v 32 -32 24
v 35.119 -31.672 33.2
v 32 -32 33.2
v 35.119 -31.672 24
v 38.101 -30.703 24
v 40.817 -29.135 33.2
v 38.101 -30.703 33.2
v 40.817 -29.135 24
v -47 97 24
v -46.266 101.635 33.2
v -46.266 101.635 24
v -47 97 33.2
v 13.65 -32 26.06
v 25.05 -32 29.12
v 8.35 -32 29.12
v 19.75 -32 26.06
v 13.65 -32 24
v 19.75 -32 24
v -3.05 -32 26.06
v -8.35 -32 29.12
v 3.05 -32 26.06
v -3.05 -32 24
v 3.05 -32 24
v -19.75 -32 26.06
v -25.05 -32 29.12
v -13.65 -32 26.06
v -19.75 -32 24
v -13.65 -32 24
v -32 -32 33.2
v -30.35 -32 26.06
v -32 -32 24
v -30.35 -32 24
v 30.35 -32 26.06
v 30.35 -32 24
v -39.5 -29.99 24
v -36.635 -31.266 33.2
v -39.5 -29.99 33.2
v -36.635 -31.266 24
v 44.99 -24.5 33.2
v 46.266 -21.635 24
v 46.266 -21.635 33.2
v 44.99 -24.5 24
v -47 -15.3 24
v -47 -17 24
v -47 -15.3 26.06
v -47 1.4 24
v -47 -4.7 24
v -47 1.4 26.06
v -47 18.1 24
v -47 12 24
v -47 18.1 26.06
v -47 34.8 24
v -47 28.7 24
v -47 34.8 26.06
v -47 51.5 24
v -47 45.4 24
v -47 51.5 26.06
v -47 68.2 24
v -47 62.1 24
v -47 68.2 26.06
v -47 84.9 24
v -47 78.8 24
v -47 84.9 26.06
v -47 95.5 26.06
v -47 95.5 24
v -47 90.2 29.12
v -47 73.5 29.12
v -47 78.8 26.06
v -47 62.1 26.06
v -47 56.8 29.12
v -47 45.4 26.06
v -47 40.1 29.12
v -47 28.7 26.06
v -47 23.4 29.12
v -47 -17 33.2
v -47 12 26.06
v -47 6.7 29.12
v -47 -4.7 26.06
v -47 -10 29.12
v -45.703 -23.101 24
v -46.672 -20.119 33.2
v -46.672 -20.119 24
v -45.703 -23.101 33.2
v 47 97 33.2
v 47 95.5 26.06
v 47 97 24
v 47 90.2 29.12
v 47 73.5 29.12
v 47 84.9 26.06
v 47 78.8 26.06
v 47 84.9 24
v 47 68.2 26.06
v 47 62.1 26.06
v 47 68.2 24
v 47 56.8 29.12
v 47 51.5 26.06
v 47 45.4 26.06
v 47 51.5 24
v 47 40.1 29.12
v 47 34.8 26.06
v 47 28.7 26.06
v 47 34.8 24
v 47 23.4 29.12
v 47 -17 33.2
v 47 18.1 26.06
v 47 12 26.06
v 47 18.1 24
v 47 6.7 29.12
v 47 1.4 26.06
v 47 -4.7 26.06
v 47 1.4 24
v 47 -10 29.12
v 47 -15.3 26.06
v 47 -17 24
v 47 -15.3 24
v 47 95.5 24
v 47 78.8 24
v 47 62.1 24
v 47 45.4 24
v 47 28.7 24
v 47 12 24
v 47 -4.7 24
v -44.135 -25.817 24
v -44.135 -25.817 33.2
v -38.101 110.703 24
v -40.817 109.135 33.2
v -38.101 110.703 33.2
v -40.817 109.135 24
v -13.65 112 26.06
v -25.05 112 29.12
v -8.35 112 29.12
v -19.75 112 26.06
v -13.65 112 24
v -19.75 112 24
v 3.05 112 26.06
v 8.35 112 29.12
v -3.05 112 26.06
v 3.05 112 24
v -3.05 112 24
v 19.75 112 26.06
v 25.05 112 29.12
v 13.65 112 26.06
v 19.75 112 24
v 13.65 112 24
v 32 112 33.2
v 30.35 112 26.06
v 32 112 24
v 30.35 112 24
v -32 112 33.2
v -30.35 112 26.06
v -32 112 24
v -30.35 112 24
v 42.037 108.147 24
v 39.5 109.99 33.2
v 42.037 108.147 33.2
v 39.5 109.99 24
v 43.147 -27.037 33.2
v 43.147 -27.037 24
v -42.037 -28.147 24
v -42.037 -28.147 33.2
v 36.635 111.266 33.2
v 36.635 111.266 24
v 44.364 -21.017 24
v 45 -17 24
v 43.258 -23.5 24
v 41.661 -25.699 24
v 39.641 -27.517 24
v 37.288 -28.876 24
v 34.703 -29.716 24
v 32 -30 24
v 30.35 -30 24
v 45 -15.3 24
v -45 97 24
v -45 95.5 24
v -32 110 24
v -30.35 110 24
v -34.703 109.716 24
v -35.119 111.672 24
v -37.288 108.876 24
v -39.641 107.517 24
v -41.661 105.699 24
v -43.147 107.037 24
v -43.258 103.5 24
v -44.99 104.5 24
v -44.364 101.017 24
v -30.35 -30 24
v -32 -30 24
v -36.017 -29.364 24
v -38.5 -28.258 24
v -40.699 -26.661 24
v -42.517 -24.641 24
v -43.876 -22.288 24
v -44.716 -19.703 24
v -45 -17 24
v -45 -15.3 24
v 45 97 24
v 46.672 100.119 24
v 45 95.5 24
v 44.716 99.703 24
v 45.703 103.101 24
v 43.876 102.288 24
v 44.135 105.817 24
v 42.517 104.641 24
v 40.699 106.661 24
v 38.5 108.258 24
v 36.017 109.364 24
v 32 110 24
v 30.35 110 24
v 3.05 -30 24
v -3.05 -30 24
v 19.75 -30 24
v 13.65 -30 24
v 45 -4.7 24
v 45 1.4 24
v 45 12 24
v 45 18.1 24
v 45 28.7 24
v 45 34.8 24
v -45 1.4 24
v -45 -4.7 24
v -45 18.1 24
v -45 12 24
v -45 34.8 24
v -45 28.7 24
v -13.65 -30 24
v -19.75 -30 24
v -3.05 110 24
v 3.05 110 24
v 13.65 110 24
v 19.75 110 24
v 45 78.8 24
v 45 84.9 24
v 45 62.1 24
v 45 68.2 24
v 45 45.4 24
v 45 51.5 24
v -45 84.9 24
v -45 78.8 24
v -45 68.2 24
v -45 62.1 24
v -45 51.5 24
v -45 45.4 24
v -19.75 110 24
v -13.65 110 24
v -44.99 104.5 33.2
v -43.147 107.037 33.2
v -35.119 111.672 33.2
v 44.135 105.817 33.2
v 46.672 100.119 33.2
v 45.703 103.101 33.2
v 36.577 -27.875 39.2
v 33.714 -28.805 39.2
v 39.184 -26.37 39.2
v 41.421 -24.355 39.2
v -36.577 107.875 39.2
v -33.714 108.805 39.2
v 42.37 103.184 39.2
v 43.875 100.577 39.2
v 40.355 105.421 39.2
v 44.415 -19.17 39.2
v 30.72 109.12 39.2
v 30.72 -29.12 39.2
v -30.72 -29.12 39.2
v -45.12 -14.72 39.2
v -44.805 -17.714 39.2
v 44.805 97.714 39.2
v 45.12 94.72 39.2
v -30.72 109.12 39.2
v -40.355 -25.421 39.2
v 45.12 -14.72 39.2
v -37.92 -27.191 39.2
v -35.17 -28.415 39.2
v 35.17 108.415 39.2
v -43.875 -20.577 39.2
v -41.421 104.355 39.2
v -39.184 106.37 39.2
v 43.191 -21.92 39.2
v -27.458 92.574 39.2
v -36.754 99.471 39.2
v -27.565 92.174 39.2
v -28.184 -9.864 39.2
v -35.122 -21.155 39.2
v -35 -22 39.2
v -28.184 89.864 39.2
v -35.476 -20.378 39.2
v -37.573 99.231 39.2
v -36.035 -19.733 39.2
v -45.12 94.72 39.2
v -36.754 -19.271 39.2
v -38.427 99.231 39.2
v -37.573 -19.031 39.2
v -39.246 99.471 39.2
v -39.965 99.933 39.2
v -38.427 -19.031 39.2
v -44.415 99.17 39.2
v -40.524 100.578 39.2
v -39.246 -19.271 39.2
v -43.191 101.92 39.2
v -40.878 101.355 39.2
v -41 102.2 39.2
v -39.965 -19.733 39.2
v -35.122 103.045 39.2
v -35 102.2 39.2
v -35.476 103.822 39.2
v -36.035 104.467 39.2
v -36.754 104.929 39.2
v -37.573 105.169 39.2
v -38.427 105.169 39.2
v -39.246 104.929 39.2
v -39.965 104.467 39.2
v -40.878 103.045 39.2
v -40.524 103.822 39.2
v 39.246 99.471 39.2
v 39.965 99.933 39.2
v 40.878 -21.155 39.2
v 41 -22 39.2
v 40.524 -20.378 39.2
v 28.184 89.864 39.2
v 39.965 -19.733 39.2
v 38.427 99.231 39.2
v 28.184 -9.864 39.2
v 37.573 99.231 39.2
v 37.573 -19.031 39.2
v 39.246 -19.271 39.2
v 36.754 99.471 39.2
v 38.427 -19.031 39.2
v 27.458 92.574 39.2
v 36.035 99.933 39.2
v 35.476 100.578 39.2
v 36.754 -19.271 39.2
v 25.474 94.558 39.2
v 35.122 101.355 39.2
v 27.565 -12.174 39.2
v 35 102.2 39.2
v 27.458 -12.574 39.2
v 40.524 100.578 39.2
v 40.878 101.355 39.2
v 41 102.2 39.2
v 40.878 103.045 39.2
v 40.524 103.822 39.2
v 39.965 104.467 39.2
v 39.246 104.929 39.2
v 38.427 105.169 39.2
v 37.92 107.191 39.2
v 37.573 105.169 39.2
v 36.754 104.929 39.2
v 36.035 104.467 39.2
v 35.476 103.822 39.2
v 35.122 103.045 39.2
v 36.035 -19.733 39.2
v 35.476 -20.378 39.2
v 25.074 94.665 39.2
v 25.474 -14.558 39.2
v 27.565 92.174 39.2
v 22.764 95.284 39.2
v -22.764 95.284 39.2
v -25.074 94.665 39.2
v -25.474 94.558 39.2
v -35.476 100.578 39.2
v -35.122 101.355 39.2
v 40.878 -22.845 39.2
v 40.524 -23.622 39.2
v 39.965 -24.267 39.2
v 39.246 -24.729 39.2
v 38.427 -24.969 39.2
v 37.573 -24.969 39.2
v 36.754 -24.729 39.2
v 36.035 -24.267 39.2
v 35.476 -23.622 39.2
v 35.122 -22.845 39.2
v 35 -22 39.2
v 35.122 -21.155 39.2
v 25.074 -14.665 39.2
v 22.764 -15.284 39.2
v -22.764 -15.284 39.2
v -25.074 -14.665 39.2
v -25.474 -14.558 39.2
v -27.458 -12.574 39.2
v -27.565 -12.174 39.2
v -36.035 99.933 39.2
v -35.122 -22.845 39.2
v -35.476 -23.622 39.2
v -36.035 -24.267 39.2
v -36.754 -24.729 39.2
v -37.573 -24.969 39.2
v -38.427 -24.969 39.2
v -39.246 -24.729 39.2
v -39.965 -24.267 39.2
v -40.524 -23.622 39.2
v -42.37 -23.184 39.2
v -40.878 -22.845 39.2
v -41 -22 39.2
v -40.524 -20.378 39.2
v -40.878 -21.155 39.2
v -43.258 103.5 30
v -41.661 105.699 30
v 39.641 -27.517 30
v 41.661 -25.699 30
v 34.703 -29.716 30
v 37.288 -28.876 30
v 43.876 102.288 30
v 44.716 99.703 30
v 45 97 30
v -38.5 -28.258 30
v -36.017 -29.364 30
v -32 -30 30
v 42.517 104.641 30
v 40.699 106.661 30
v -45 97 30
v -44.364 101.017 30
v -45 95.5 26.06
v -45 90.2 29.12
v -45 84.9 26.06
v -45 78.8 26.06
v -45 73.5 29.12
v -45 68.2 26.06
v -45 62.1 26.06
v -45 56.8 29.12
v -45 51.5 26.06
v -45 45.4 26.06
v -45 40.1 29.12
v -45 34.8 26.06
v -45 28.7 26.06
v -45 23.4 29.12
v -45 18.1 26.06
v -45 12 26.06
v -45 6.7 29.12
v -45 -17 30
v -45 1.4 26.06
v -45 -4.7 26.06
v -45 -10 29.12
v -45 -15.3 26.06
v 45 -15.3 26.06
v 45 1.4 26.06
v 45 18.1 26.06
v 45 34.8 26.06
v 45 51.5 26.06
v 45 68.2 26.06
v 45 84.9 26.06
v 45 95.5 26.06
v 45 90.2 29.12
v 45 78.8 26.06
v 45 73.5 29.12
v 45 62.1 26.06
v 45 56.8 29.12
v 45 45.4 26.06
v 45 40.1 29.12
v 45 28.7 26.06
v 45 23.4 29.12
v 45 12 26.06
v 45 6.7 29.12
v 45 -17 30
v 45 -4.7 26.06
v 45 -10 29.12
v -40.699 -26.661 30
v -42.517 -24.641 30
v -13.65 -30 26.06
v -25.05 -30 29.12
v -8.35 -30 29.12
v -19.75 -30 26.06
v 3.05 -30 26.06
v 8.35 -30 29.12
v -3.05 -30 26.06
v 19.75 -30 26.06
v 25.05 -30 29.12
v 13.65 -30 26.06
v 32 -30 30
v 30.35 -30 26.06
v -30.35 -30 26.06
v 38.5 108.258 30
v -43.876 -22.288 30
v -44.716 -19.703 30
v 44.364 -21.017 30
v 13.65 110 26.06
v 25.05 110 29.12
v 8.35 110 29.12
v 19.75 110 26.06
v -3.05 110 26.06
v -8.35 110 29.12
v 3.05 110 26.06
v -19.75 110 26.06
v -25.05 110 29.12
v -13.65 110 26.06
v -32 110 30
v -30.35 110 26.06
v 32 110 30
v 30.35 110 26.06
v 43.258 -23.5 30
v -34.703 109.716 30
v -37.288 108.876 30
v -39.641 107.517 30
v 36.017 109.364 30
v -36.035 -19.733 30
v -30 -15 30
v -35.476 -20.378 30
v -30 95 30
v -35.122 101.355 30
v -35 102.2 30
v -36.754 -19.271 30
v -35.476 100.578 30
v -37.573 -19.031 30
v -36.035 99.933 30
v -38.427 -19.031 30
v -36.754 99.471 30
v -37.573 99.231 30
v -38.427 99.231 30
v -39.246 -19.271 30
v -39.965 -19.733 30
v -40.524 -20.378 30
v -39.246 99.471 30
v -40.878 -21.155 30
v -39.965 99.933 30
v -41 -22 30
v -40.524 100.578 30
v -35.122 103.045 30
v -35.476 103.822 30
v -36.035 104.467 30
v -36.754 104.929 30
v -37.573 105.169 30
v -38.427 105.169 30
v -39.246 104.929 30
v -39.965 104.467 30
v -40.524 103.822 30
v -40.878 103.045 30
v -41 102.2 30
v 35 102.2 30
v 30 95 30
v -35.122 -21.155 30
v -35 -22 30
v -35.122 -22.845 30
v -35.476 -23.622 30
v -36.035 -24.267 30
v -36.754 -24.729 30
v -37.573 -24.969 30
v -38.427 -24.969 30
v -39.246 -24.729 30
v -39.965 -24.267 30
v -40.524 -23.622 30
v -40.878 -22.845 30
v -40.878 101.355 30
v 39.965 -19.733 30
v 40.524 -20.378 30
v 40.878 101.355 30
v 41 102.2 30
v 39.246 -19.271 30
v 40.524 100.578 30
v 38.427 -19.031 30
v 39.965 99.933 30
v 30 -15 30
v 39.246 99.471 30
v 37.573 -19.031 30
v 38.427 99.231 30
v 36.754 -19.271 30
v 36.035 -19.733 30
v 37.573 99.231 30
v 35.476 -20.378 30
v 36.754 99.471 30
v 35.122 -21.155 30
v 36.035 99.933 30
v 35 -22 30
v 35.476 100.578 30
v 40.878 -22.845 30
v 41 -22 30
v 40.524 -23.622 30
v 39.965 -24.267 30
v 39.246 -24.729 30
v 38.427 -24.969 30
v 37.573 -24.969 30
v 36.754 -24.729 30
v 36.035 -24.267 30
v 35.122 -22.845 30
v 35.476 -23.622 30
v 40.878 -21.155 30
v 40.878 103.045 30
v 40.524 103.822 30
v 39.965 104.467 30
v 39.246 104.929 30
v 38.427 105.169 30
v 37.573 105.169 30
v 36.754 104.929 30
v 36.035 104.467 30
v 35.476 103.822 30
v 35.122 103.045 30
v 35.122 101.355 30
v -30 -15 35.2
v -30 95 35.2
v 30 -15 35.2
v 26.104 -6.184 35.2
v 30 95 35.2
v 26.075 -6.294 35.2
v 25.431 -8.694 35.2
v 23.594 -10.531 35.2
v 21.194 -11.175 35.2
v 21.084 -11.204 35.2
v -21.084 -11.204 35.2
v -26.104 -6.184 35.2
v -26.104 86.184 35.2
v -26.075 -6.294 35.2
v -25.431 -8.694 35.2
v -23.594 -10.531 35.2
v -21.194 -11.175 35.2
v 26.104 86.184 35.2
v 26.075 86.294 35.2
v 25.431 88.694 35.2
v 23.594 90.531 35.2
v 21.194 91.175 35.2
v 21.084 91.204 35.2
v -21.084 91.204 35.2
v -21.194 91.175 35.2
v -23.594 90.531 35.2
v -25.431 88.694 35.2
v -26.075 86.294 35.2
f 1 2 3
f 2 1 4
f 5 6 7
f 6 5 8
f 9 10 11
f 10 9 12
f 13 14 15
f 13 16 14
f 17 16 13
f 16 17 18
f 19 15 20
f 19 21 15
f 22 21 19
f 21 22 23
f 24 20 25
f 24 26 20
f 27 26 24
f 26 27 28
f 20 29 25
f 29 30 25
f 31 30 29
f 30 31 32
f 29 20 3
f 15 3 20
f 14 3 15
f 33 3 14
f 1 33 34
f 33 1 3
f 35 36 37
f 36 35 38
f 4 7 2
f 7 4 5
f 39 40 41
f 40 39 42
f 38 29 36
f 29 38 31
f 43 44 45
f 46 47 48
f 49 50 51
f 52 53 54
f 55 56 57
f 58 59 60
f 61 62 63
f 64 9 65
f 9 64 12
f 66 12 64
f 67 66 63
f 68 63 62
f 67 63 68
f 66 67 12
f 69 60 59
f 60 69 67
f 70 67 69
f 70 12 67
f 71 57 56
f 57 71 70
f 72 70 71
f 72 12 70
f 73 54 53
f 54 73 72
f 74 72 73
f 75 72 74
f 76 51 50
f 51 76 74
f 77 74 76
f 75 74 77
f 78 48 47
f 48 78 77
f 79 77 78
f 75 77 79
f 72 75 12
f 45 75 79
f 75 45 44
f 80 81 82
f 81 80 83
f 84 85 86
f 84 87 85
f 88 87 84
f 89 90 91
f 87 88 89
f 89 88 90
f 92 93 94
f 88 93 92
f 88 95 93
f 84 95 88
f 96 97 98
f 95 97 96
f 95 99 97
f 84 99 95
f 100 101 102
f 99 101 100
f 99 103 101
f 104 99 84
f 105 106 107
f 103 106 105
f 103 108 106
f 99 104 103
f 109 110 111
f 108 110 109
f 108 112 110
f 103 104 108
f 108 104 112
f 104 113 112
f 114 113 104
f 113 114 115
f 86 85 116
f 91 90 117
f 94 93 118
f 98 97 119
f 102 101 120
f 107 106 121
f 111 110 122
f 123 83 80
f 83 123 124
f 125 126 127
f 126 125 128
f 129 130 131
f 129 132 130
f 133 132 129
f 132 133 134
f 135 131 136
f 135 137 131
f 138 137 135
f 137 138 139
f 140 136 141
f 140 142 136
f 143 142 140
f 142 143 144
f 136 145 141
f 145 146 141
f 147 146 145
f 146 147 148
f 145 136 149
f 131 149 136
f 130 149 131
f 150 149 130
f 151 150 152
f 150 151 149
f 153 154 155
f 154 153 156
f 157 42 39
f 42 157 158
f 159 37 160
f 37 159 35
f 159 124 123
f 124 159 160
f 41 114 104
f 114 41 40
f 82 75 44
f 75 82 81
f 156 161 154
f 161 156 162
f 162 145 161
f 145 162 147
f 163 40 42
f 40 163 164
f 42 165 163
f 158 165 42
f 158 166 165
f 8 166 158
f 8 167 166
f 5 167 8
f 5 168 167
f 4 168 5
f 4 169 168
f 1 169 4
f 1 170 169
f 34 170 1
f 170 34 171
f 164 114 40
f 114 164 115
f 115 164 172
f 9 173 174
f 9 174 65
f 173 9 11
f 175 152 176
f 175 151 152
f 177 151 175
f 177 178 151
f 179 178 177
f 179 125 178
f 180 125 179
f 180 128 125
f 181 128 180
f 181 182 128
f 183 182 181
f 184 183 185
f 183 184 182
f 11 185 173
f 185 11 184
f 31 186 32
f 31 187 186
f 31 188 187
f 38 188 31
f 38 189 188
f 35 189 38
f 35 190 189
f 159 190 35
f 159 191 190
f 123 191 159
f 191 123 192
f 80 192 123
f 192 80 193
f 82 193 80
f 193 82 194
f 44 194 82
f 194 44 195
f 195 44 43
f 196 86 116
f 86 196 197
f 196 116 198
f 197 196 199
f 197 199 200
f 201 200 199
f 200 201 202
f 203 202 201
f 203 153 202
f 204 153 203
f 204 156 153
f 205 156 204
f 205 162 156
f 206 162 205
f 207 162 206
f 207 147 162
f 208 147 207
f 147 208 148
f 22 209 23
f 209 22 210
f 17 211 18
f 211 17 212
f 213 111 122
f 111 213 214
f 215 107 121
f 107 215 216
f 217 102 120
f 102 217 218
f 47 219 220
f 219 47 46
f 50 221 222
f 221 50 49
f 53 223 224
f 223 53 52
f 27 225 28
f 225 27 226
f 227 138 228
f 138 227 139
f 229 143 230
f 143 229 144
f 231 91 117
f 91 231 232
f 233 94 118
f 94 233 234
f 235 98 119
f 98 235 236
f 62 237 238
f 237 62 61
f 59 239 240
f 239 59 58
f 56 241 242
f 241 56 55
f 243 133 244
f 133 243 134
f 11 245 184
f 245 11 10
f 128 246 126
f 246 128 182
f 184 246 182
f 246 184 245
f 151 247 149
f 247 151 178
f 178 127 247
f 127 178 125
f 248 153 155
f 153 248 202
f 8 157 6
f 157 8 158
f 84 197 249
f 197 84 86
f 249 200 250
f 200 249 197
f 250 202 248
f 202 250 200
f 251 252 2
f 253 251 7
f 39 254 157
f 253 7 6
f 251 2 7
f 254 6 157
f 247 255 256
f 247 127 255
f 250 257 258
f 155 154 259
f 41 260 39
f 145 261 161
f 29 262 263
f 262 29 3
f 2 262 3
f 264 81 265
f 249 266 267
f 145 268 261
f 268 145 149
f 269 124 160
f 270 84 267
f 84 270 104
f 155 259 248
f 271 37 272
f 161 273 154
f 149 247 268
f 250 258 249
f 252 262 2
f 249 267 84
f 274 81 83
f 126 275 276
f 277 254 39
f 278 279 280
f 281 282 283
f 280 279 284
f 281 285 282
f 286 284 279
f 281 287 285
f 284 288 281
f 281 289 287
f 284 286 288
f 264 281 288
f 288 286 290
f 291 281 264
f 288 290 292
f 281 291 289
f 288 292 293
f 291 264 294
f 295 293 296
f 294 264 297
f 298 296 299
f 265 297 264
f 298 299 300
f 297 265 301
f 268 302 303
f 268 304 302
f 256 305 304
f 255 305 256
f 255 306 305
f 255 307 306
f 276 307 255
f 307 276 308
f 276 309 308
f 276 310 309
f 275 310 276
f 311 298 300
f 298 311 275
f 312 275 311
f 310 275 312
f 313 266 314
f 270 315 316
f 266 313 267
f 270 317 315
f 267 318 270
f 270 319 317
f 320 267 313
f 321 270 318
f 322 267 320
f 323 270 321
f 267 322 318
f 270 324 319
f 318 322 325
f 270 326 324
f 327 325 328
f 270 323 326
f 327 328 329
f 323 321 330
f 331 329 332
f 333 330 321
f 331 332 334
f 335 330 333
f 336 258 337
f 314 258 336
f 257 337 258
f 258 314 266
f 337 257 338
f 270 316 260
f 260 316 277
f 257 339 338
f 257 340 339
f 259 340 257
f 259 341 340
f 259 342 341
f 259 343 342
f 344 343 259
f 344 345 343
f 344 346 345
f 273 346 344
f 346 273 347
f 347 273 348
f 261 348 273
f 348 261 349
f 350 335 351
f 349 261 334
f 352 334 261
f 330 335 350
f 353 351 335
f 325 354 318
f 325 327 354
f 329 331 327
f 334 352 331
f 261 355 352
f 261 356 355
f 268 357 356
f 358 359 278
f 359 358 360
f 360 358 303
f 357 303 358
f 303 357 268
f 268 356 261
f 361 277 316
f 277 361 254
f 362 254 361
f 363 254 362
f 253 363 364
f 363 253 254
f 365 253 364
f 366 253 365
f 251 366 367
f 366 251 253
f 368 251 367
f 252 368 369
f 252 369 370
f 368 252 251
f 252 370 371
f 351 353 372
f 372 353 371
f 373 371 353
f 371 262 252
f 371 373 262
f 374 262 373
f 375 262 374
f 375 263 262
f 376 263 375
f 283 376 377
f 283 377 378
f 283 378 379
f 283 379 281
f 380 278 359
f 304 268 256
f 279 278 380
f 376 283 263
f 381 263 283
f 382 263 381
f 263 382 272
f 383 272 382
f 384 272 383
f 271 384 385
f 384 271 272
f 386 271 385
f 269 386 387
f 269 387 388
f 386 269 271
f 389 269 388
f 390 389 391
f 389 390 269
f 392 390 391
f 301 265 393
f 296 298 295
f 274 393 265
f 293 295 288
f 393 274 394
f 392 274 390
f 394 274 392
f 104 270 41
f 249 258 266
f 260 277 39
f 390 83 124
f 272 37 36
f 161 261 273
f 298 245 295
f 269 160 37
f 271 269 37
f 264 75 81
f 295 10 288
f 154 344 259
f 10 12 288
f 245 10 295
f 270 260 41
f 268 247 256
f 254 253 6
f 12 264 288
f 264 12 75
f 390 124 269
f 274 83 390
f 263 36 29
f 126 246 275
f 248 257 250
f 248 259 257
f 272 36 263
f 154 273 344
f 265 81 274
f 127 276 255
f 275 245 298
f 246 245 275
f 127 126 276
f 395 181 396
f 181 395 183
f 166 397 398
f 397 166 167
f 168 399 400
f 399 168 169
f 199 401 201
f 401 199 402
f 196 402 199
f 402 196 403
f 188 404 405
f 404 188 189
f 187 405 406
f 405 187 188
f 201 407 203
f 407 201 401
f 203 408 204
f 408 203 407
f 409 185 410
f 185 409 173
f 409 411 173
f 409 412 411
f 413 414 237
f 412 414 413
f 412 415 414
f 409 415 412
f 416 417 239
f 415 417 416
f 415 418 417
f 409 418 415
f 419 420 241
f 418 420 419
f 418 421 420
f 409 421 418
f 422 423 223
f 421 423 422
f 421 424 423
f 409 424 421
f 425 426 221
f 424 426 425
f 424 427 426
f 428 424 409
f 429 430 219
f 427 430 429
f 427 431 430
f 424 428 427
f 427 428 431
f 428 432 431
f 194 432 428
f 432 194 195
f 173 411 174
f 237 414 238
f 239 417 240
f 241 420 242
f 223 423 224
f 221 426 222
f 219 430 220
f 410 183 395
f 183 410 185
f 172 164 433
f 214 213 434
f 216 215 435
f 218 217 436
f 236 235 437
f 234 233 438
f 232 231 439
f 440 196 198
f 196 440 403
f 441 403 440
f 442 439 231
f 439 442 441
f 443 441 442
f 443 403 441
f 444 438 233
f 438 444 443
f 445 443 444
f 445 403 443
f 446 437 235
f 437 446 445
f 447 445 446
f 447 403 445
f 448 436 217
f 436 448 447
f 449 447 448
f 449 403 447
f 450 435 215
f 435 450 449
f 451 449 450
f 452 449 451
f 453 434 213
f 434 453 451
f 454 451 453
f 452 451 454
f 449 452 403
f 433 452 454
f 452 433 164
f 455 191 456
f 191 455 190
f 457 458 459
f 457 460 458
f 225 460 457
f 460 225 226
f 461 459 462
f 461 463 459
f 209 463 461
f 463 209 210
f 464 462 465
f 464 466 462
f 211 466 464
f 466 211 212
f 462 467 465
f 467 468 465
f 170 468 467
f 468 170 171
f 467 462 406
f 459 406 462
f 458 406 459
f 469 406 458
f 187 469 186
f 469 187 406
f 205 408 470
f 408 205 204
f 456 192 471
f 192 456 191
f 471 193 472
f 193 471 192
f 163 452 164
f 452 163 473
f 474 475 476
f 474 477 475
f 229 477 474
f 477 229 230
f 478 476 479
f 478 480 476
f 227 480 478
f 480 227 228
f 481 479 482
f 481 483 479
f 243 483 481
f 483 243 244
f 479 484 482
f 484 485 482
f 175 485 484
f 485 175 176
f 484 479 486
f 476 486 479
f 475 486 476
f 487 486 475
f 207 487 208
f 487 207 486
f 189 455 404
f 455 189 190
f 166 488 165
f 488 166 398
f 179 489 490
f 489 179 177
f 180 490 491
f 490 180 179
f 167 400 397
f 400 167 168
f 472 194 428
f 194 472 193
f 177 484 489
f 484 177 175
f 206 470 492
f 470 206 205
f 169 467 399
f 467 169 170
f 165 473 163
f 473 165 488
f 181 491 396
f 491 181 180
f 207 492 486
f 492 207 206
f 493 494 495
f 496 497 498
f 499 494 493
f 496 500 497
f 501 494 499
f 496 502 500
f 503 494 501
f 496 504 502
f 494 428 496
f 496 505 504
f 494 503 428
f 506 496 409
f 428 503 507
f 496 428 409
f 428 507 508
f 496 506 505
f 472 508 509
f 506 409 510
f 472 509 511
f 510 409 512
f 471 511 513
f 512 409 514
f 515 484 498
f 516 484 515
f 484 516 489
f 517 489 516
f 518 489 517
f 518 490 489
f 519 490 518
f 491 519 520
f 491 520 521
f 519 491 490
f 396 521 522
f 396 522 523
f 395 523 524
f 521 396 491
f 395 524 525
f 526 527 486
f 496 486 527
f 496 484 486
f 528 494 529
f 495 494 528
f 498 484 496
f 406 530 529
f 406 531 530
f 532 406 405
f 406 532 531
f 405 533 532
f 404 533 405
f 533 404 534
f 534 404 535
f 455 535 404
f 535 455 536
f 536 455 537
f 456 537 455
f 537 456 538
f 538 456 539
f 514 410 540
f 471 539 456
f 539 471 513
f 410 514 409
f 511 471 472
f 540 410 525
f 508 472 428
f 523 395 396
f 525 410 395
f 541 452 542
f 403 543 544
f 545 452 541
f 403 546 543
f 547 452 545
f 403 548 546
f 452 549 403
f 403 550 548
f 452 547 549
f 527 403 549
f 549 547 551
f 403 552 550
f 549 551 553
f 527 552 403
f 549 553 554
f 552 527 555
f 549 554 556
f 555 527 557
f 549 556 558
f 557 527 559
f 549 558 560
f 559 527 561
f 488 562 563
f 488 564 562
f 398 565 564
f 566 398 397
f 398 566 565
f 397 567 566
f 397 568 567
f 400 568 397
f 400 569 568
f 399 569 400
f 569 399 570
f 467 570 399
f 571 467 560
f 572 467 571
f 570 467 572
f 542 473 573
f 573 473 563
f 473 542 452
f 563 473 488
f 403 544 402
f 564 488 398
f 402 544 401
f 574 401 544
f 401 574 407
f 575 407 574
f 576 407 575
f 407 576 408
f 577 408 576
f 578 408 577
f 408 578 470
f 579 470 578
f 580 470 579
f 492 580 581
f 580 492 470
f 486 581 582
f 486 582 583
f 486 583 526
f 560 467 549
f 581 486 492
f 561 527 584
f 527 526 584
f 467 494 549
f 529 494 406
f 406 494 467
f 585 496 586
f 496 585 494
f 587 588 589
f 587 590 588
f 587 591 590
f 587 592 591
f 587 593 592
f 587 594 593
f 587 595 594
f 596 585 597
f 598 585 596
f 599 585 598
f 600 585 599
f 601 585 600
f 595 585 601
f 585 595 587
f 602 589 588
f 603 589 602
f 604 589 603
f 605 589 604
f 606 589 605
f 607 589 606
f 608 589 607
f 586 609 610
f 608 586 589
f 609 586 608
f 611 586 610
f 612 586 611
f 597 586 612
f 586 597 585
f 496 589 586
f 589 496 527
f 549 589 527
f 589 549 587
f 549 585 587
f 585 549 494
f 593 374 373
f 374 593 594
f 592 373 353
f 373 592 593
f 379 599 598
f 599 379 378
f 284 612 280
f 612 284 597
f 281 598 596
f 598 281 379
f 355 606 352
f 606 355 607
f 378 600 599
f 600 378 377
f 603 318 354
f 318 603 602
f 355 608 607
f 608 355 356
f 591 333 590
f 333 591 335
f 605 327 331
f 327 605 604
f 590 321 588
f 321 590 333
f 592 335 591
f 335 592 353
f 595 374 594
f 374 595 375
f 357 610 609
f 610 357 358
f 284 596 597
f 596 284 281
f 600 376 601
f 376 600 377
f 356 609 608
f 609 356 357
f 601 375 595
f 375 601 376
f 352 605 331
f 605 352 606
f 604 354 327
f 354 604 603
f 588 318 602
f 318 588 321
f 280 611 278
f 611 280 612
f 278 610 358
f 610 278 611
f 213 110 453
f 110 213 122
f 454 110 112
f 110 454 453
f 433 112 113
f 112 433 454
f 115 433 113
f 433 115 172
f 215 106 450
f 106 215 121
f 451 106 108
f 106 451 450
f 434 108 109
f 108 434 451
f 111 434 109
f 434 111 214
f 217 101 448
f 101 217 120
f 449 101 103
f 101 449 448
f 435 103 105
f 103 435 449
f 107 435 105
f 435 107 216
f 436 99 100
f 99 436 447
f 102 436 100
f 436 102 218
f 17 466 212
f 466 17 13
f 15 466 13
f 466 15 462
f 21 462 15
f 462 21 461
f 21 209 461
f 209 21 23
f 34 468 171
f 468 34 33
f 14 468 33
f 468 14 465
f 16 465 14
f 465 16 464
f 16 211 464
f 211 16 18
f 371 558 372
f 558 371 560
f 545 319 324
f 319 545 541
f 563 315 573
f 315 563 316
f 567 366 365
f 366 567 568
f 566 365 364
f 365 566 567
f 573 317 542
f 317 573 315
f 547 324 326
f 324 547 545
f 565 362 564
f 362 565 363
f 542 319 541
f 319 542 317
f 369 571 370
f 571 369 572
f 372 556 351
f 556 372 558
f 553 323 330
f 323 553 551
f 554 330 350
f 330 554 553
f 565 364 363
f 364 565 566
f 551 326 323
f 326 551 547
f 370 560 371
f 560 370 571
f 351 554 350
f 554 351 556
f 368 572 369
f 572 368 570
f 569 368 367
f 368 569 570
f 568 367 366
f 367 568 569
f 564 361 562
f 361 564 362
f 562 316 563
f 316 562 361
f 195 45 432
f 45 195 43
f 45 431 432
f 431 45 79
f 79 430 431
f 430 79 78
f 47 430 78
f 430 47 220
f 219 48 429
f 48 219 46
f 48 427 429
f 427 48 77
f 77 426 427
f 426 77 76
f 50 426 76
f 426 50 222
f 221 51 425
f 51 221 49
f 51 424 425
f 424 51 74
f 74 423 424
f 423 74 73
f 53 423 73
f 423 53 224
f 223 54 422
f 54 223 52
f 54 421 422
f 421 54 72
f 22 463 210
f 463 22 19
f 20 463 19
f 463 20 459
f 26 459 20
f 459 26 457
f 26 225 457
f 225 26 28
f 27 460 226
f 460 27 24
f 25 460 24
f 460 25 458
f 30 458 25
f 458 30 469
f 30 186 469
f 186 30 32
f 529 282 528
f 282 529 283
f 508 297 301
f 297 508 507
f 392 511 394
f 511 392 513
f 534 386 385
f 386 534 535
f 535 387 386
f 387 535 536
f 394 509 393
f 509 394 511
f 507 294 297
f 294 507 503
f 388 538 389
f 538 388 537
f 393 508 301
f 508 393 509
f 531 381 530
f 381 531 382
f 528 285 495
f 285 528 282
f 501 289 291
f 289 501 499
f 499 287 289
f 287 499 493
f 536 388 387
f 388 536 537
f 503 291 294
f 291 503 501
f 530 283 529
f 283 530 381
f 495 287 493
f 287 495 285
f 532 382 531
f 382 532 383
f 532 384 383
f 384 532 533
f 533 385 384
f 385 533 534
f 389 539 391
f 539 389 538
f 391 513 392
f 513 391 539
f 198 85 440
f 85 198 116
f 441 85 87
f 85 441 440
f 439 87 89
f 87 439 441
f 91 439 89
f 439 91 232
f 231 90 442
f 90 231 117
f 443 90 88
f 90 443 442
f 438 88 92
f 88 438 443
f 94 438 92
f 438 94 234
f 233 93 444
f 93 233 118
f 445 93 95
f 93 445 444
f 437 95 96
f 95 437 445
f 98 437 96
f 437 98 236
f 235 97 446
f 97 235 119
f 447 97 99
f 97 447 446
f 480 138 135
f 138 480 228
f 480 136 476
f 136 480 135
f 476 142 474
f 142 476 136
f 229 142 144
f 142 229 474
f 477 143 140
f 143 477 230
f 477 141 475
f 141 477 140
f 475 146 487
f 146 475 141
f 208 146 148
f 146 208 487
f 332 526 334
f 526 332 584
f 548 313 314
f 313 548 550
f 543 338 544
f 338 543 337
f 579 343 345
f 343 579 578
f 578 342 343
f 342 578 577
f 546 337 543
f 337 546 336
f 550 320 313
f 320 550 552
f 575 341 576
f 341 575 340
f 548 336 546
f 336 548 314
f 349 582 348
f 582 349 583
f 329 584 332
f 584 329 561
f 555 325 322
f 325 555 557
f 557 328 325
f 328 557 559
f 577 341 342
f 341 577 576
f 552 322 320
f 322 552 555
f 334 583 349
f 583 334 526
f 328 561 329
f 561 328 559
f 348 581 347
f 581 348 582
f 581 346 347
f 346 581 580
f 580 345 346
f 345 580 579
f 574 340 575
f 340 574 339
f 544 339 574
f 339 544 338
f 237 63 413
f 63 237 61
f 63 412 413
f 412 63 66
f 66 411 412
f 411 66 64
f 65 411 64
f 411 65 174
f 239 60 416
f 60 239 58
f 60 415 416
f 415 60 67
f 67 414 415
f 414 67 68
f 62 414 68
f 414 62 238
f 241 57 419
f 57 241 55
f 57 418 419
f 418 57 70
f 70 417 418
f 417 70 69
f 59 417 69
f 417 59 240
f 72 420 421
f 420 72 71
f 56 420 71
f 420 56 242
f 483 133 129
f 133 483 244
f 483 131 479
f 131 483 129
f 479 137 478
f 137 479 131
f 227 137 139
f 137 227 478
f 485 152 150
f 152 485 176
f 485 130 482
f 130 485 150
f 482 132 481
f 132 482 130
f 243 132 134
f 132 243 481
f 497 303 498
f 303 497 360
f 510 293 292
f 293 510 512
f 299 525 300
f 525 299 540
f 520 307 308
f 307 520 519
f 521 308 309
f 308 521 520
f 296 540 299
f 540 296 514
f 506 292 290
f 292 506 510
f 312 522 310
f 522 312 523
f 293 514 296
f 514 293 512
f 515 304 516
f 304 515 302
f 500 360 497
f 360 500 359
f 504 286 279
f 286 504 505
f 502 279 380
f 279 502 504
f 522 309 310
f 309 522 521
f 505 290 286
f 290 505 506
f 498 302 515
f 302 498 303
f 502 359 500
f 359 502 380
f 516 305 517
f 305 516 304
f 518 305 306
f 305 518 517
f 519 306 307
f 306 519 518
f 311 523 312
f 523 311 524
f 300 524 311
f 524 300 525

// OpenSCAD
// file: Lights4b.scad
// Lights4b
// Ferrules for 3 mm fiber optic sideglows

//p1=[ [0,0], [0,4], [0.5,5], [5.75,5], [5.85,4], [9.15,4], [9.25,5], [12,5], [27,3], [27,0] ];
p1=[ [0,0], [0,4], [0.5,6], [5.75,6], [5.85,5], [9.15,5], [9.25,6], [12,6], [27,3], [27,0] ];

module Ferrule1(){

difference(){
    rotate([0,-90,0])
    rotate_extrude($fn=6){
        rotate([0,0,-90])
        polygon(points=p1);
    }    
    
    color("cyan")
    rotate([0,90,0])
//    cylinder(r1=2.0,r2=1.8, h=50,$fn=6);
    cylinder(r1=1.9,r2=1.9, h=50,$fn=6);
}

}

//---------------------------------------------
// make a solid body version, ie no cut for the fiber
module Ferrule2(){

//difference(){
rotate([0,-90,0])
rotate_extrude($fn=6){
    rotate([0,0,-90])
    polygon(points=p1);
}    

}

//--------------------------------------------------------
// make a solid body version, scale the polygon, use this for making
// cuts into the Rx
module Ferrule3(){

rotate([0,-90,0])
rotate_extrude($fn=6){
    rotate([0,0,-90])
    scale(1.02)
    polygon(points=p1);
}    

}
//--------------------------------------------------------
// make a solid body version, scale the polygon, use this for making
// cuts into the Rx
module Ferrule4(){

intersection(){
rotate([0,-90,0])
rotate_extrude($fn=6){
    rotate([0,0,-90])
    scale(1.02)
    polygon(points=p1);
}    
translate([8,-20,-10]) linear_extrude(height=20) square(40);
}

}

//============================


Ferrule1();


//translate([0,0,-13]) Ferrule4();

/*
color("cyan")
translate([-1,0,0])
rotate([0,90,0])
cylinder(r=1.5,h=40,$fn=30);

color("orange")
translate([0,0,13])
Ferrule2();

color("red")
translate([0,0,2*13])
Ferrule3();

color("pink")
intersection(){
    translate([0,0,3*13])
    difference(){
        Ferrule3();
        Ferrule2();
    }
    translate([-35,0,0])
    linear_extrude(heigth=100)
    square(100,center=true);
}

*/
// file: Lights4a.scad
// Lights4a
// headblock for leds, fibers insert with ferrules Lights4b part
use <Lights4b.scad>

module Rx1(){
tol=0.20;
Off1 = 1.0;



difference(){
// Rx body
translate([-4,-8.35,-8]) color("cyan")
linear_extrude(height=15) square(size=[13,16.7]);

Ferrule3();


//==========
// led tape and chip
translate([-1.85,-20,-6])
//linear_extrude(height=12) square(size=[0.2+tol,40]);
linear_extrude(height=16) square(size=[0.2+tol,40]);
translate([-1.65,-2.5-tol/2-Off1,-2.5-tol/2])
linear_extrude(height=5+tol) square(size=[1.65+tol,5+tol]);


//-------
// cut for the chip head
color("red")
translate([-1.65,-2.5-tol/2-Off1,-2.5-tol/2])
linear_extrude(height=12) 
    square(size=[1.65+tol*2,5+tol*2]);


// cut for the ferrule head
translate([3,0,-3]) color("pink")
linear_extrude(height=12) square(size=[6,12*0.866],center=true);



// cut for the ferrule neck
translate([7,0,0]) color("green")
linear_extrude(height=10,scale=1.2) square(size=[6,8.66],center=true);

// cut for extra clearance at the bottom of the well
translate([0,0,-4.5]) color("orange")
rotate([0,90,0]) 
cylinder(r=1.5,h=12,$fn=16);

// material reduction on sidewalls
// possible locking mechanism?
translate([3,-20,5.0]) color("gray") rotate([-90,-90,0]){
cylinder(r=3.0/0.866,h=40,$fn=6);
    translate([3,0,0])
    linear_extrude(height=40) square(6,center=true);
}


}  // end of difference

} // end of module

//==================================

Rx1();

/*

for(i=[0:0]){
    translate([0,16.7*i,0]) Rx1();
}
*/
//Ferrule1();
// main file
// BikeLights4e
// This is the lid for v4 hex
use <Lights4a.scad>
use <Lights4b.scad>

module Corner1(){
//--------------------------------------------
difference(){
//  Connectors form outer wall, all around loop
union(){
color("red"){
for(i=[0:3]){
    translate([35,-10+16.7*i,9+14]) {
        Rx1();
        Ferrule3();
    }
}
}
color("green"){
for(i=[0:3]){
    translate([35,-10+16.7*i,7+0]) rotate([180,0,0]) {
        Rx1();
        Ferrule3();
    }
}
}

color("yellow"){
for(i=[2:3]){
    translate([-16.7*1.5+16.7*i,-20,9+14]) rotate([0,0,-90]){
        Rx1();
        Ferrule3();
    }
}
}
color("yellow"){
for(i=[2:3]){
    translate([-16.7*1.5+16.7*i,-20,7+0]) rotate([180,0,-90]){
        Rx1();
        Ferrule3();
    }
}
}


// reinforce the corner joins
color("gray")
translate([32,-17,0])
linear_extrude(height=30){
    intersection(){
        circle(12,center=true);
        translate([0,-12,0]) square(12);
    }
}

}  // end of union

/*
// cut out the corner joins
color("blue")
translate([32.25,-17.25,0])
linear_extrude(height=13){
    square(size=[2.75,2.75],center=true);
}
color("green")
translate([32.25,-17.25,17])
linear_extrude(height=13){
    square(size=[2.75,2.75],center=true);
}

// vertical bolt hole
translate([38,-22,0])
cylinder(r=3,h=30,$fn=22);

// horizontal holes thru bolt hole
color("pink"){
    translate([38,-16,3])
    rotate([90,0,0]) cylinder(r=2,h=5,$fn=22);
    translate([31,-23,3])
    rotate([90,0,90]) cylinder(r=2,h=5,$fn=22);

    translate([38,-16,27])
    rotate([90,0,0]) cylinder(r=2,h=5,$fn=22);
    translate([31,-23,27])
    rotate([90,0,90]) cylinder(r=2,h=5,$fn=22);
}
*/

} // end of difference

// Add back the bolt hole to cut into the lid
// vertical bolt hole
translate([38,-22,-15])
cylinder(r=3,h=60,$fn=22);

// reinforce the corner joins
color("blue")
translate([31.0,-16.0,0])
linear_extrude(height=30){
    circle(2,center=true,$fn=22);
}

} // end of module Corner1


//===============================
// Top lid
difference(){
// main boss
translate([0,40,30-6]){
    difference(){
        union(){
            // main boss
            linear_extrude(height=5.2+4,scale=1)
            offset(r=15)
            square(size=[64,114],center=true);
            
            // upper bevel
            translate([0,0,5.2+4])
            linear_extrude(height=6,scale=0.96)
            offset(r=15)
            square(size=[64,114],center=true);
        }
        
        // cut to make overlapping lip
        linear_extrude(height=6,scale=1)
        offset(r=13)
        square(size=[64,114],center=true);
        
        // cut for the top window
        color("pink")
        translate([0,0,6])
        linear_extrude(height=5.2)
        square(size=[60,110],center=true);

        translate([0,0,6+5])
        linear_extrude(height=5,scale=1.1)
        offset(r=5,$fn=12)
        square(size=[60-18,110-18],center=true);
    }
    
}

//=========================
// The box walls
difference(){
    Corner1();
    /*
    // pass through for the wiring
    color("pink")
    translate([31.5,-2,0])
    linear_extrude(height=12){
        square(size=[4,8],center=true);
    }
    color("pink")
    translate([31.5,-2,30-12])
    linear_extrude(height=12){
        square(size=[4,8],center=true);
    }
    */
}


// no cuts in remaining 3 corners
translate([0,0,30]) rotate([0,180,0]) Corner1();
translate([0,13.4+4*16.7,30]) rotate([180,0,0]) Corner1();
translate([0,13.4+4*16.7,0]) rotate([180,180,0]) Corner1();

} // end of difference lid - walls

/*   
//==============================
// chassis
translate([-27,8,0]) rotate([0,0,0])
union(){
// 7a chassis
B1p=[ [0,1], [1,0], [53,0], [54,1], [54,79], [48,85], [6,85], [0,79] ];
translate([0,0,0]) color("gray")
linear_extrude(height=16)
polygon(points=B1p);
// wiring rises above chassis
linear_extrude(height=26)
offset(r=-2) polygon(points=B1p);

// Switch 1
translate([2,1.6,0]) color("blue"){
    union(){
        // switch body including solder lug clearance
        linear_extrude(height=12) 
        offset(r=tol)
         square(size=[13, 15]);
        
        translate([6.5,0,5]) rotate([90,0,0]) cylinder(r=3.3,h=10,$fn=30);
    }
}
// Switch 2
translate([54-15,1.6,0]) color("blue"){
    union(){
        // switch body including solder lug clearance
        linear_extrude(height=12) 
        offset(r=tol)
         square(size=[13, 15]);
        
        translate([6.5,0,5]) rotate([90,0,0]) cylinder(r=3.3,h=10,$fn=30);
    }
}
}

*/
